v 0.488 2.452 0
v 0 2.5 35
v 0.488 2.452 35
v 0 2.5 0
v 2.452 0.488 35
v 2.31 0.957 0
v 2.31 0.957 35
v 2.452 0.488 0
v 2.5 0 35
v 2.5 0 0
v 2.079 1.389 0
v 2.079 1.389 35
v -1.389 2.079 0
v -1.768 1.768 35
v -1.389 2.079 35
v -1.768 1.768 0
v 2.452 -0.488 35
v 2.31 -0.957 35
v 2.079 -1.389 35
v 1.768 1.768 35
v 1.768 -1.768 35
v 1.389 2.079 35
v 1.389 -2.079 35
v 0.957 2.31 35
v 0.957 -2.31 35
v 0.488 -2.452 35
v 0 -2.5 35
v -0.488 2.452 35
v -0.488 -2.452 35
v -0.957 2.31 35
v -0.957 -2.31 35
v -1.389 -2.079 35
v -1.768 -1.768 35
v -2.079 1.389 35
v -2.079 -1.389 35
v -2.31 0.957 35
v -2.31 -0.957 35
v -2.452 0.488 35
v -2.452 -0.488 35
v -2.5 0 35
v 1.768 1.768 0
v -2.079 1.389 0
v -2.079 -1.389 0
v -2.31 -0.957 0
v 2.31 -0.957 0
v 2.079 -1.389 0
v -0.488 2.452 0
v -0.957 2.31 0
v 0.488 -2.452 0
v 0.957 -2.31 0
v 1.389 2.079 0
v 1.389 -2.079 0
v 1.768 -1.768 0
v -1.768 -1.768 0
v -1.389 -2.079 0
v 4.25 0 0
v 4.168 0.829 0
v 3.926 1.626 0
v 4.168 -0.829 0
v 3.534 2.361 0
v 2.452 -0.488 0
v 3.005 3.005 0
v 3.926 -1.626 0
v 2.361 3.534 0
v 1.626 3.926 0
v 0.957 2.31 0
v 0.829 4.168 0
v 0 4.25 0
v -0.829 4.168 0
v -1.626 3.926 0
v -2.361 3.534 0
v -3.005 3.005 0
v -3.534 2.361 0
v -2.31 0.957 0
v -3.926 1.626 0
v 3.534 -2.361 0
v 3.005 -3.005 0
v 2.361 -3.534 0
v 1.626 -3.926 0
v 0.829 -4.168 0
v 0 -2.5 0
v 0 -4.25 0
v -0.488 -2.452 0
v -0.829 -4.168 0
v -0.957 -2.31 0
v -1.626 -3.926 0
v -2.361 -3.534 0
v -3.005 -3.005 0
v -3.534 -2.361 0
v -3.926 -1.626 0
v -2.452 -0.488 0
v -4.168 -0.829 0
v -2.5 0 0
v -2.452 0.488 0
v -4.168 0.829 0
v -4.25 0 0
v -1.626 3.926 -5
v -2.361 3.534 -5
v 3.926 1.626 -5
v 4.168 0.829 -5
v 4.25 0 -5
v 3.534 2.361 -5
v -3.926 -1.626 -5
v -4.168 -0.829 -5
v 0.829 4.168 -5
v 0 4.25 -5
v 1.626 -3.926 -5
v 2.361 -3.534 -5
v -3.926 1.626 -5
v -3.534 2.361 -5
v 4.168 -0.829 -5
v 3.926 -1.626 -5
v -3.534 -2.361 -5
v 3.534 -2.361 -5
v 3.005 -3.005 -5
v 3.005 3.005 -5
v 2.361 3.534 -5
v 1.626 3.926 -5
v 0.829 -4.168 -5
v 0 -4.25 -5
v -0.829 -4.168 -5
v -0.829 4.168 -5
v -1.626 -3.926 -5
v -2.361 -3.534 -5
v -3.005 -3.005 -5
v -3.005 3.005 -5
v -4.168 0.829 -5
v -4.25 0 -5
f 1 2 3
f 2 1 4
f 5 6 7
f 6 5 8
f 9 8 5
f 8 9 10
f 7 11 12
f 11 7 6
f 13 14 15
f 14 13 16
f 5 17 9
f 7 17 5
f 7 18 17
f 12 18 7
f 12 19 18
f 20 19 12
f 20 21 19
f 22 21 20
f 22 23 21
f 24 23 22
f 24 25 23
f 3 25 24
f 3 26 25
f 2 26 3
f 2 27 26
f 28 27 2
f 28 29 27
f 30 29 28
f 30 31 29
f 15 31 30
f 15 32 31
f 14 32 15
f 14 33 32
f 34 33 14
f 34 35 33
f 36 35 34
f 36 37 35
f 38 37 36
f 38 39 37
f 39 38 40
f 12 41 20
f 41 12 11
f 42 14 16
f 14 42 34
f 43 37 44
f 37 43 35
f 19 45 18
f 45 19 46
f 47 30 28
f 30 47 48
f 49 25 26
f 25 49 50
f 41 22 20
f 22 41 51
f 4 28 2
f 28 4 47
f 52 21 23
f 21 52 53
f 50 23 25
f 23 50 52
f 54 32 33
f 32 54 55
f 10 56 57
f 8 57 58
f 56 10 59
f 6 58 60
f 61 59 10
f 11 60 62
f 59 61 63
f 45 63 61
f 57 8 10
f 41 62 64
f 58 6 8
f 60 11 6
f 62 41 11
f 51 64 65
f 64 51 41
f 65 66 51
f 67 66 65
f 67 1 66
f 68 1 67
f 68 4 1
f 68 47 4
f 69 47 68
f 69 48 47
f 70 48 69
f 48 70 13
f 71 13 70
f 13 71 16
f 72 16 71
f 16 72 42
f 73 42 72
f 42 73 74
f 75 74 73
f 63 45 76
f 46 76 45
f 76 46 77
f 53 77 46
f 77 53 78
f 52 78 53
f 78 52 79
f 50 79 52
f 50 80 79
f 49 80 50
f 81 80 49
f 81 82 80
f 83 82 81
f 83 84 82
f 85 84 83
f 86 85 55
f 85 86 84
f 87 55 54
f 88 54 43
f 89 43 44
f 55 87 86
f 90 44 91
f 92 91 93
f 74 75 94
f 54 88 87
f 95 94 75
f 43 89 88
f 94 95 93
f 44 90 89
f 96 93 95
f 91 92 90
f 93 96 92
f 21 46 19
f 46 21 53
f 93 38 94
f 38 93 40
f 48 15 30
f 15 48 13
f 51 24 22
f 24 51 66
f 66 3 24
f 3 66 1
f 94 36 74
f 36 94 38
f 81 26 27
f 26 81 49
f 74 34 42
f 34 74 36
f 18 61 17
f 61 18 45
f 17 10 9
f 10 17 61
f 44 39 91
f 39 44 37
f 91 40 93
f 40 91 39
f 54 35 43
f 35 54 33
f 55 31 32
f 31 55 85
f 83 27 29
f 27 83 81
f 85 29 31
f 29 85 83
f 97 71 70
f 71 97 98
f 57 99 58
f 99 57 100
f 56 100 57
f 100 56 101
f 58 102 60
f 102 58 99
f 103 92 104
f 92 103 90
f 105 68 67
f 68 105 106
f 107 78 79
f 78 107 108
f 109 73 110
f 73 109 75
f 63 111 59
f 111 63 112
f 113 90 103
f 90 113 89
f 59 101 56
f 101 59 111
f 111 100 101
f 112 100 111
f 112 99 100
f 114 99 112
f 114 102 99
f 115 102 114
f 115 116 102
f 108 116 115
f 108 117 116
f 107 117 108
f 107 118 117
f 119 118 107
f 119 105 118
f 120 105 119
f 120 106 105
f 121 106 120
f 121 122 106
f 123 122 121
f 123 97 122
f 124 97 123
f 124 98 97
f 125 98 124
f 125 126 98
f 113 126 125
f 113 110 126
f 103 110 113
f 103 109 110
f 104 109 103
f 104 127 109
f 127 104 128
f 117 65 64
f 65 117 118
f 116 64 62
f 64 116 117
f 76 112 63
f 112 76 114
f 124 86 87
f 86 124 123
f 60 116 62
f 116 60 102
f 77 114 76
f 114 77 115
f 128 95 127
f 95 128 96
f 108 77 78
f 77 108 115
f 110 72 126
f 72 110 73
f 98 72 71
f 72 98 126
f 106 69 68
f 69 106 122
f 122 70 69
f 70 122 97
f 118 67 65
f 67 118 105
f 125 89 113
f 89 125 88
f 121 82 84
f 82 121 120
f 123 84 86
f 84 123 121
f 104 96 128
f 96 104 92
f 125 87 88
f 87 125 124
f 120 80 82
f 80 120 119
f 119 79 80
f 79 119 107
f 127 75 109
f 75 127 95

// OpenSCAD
// Purchased hardware envelope. Not printable.
$fn=32;union(){cylinder(d=5,h=35);translate([0,0,-5])cylinder(d=8.5,h=5);}
